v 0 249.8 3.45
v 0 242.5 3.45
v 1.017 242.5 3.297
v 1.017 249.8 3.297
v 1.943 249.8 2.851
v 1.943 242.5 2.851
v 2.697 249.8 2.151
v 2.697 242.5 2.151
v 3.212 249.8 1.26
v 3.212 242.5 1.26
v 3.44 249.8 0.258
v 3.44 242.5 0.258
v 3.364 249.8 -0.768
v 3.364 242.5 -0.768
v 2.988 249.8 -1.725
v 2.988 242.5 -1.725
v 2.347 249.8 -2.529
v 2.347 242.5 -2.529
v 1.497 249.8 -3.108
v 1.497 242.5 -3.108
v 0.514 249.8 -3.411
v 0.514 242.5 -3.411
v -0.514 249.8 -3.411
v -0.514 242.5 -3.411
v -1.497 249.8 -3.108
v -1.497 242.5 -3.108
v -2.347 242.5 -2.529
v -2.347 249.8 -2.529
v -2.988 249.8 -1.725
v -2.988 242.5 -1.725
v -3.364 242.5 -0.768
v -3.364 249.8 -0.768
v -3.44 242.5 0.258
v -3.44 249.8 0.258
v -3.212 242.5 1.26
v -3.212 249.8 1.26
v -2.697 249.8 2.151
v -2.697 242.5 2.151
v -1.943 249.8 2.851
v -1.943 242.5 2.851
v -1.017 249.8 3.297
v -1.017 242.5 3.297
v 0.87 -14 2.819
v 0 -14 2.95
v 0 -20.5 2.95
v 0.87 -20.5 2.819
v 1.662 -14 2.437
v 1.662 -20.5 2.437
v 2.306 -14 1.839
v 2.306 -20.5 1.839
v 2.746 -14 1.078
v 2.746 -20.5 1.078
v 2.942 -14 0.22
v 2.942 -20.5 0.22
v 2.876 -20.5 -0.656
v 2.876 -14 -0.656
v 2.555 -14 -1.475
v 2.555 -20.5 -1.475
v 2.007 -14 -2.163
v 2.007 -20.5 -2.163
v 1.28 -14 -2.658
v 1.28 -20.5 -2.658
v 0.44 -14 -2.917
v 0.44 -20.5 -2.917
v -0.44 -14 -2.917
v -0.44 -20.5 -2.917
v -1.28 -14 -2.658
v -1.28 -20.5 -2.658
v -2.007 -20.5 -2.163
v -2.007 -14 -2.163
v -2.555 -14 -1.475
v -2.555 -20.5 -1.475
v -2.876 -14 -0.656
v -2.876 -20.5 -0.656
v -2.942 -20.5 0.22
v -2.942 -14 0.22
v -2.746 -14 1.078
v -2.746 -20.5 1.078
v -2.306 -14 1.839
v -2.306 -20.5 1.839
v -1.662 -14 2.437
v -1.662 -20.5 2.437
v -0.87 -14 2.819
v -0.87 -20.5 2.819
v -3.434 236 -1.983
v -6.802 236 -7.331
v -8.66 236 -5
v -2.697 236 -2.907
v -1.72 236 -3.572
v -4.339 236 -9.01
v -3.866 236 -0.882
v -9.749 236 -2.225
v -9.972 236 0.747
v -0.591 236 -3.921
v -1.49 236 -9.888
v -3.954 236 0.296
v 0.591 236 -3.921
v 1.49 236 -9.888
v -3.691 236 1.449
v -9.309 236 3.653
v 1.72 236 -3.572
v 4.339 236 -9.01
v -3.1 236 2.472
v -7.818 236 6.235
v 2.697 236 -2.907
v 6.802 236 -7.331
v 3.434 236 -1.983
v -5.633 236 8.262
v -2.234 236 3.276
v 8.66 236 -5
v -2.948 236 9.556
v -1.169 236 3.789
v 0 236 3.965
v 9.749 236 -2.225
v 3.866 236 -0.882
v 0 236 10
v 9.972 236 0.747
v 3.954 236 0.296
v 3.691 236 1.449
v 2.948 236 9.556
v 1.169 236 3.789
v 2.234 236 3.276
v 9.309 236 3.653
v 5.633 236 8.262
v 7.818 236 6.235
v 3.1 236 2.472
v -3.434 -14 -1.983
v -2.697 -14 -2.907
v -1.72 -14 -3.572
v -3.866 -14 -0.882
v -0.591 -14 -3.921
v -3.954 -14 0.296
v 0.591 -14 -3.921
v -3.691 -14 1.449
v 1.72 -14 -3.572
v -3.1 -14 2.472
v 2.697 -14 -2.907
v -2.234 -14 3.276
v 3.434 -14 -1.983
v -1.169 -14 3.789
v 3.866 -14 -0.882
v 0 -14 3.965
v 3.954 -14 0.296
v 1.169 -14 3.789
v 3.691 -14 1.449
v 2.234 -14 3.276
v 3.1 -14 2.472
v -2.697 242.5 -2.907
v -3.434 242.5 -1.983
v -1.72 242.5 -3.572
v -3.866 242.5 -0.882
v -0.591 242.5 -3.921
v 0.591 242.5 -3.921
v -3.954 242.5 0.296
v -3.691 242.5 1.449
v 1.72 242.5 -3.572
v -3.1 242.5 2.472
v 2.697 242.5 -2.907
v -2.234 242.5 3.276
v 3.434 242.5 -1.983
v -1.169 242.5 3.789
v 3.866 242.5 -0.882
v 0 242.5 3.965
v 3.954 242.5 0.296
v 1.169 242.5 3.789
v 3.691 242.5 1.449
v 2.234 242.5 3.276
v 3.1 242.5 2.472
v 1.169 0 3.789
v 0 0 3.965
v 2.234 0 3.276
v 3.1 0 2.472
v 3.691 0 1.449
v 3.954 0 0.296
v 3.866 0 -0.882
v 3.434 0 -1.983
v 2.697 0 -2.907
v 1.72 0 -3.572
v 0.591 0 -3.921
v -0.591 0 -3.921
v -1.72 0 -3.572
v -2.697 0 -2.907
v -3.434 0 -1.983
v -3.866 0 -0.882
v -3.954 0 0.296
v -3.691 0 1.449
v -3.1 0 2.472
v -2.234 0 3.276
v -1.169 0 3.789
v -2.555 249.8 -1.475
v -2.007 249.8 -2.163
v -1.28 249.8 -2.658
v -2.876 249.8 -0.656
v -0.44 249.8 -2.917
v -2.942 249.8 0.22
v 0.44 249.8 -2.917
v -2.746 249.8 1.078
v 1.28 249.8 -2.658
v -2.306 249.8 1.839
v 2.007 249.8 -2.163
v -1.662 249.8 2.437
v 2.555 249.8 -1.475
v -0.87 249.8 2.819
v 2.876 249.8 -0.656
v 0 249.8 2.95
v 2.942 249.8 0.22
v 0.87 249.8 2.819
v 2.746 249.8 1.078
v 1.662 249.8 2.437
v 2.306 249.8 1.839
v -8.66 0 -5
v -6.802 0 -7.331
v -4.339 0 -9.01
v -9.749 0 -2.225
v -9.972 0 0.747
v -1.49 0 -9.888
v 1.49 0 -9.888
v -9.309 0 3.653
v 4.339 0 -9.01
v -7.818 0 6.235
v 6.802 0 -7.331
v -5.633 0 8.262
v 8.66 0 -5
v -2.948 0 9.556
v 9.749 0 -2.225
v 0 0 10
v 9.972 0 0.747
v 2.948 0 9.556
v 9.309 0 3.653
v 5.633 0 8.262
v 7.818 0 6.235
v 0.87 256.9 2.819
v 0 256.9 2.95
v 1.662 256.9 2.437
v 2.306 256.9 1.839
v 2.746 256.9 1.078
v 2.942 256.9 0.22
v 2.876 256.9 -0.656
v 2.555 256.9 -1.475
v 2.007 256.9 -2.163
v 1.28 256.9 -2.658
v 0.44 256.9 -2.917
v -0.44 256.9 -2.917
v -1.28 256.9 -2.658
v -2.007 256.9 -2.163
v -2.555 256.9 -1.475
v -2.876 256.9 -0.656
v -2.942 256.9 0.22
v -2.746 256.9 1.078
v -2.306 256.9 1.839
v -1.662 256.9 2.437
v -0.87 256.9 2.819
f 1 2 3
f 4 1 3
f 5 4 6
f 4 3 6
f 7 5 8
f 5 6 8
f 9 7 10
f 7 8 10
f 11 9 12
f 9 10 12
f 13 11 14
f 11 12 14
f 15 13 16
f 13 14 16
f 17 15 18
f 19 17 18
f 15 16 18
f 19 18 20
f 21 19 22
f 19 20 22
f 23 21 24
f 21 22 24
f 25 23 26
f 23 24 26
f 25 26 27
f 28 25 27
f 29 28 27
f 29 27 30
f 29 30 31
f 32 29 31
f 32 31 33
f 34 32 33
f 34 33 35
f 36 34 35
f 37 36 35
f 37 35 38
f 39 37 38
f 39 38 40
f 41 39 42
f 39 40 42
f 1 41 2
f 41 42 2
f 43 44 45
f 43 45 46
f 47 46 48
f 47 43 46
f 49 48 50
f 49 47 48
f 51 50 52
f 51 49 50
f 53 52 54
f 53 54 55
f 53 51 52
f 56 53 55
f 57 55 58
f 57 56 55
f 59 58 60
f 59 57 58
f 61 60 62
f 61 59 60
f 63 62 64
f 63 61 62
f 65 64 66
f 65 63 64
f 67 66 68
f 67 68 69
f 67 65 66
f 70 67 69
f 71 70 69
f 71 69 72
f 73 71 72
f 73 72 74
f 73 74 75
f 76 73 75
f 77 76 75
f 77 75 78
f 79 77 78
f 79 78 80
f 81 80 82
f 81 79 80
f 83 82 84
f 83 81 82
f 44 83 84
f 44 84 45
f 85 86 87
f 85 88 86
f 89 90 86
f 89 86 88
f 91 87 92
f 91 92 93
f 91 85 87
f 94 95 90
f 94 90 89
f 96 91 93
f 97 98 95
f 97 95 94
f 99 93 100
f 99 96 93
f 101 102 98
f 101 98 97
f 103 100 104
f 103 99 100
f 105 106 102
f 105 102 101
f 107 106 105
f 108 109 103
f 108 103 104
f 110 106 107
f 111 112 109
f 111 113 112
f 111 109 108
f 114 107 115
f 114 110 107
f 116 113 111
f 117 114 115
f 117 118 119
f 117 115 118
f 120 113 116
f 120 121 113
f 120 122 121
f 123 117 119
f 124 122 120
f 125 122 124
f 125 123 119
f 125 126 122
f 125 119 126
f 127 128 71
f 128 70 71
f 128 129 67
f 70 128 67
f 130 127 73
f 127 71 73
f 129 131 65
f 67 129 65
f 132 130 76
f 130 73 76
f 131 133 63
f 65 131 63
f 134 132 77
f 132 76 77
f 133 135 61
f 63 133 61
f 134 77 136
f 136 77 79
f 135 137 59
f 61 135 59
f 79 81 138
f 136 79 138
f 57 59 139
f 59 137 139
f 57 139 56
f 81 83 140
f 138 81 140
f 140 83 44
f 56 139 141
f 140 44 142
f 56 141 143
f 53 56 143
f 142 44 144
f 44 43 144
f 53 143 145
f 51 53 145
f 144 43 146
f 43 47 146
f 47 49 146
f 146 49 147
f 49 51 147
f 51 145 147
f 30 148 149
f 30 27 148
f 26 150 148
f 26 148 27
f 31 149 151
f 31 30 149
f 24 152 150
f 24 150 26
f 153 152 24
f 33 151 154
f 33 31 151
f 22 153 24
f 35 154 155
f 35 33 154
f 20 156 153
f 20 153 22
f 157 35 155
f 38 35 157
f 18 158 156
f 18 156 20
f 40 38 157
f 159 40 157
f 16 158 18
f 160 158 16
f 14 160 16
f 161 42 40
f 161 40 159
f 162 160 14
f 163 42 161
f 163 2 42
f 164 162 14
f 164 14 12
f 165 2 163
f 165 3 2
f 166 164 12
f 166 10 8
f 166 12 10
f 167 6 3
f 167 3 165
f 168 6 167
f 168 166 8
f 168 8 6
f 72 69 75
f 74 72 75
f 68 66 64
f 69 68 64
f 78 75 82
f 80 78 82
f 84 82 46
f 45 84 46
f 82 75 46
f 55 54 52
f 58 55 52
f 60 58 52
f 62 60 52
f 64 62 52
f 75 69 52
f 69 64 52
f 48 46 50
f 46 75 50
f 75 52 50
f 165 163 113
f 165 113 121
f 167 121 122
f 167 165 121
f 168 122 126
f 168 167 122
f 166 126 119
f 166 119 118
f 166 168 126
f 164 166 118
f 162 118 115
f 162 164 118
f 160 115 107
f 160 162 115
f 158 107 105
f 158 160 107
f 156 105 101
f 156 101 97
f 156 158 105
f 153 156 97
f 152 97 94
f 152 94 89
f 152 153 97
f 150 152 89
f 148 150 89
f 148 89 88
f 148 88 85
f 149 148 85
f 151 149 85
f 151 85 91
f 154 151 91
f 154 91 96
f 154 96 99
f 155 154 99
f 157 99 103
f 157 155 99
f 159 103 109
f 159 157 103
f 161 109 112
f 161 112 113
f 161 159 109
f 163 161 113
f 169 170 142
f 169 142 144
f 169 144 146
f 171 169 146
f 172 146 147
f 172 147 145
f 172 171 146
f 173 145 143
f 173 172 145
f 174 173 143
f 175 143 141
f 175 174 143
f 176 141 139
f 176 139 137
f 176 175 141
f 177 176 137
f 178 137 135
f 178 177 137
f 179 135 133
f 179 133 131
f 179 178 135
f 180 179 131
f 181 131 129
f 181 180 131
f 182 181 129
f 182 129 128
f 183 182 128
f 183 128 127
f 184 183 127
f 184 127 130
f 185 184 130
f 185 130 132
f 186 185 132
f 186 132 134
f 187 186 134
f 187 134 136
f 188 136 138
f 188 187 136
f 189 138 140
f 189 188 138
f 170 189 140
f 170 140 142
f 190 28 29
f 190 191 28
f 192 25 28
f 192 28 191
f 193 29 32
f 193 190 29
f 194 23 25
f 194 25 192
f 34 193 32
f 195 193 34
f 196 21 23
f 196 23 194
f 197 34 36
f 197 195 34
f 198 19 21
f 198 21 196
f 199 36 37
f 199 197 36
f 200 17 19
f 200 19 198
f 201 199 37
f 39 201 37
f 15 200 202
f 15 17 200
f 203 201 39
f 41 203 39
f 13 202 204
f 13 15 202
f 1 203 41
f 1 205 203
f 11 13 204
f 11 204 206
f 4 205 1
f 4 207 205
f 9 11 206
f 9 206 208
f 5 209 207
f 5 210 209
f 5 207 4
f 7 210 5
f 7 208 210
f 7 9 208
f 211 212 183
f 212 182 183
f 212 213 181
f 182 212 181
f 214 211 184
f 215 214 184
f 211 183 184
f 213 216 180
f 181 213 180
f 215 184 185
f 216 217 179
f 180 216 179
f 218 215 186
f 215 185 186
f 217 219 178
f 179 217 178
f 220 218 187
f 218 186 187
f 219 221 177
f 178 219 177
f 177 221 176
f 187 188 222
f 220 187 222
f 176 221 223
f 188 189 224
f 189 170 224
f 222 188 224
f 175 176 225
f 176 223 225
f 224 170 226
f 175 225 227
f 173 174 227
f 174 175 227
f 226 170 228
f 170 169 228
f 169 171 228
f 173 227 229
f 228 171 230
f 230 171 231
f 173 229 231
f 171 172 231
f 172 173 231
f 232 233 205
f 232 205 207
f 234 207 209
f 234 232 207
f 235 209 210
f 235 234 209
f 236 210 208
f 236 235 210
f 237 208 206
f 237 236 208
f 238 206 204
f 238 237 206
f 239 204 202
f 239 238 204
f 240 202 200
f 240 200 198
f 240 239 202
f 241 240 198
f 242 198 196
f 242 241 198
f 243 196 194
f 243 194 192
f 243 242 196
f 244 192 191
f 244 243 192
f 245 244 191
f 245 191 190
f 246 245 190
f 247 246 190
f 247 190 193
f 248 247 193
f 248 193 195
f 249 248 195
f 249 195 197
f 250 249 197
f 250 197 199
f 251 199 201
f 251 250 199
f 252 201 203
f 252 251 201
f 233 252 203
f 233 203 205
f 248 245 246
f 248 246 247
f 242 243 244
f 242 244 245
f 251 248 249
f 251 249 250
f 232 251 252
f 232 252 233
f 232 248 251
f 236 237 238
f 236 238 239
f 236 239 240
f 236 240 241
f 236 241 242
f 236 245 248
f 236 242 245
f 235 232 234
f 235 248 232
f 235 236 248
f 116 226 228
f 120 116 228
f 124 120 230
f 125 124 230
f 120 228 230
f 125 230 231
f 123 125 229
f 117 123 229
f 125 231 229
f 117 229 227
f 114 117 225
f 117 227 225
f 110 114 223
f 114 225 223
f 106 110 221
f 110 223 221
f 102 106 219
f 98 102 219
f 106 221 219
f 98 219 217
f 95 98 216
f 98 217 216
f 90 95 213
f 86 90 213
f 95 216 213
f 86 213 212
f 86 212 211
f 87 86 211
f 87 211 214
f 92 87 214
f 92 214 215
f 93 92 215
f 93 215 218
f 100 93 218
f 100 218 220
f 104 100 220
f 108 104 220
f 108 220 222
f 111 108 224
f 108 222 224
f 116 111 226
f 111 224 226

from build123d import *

# Parameters (mm, degrees)
SKETCH1_R            = 10
BOSS_EXTRUDE8_DEPTH  = 236
SKETCH1_9_R          = 3.965
BOSS_EXTRUDE9_DEPTH  = 14
BOSS_EXTRUDE10_START = -14
SKETCH1_10_R         = 2.95
BOSS_EXTRUDE10_DEPTH = 6.5
BOSS_EXTRUDE11_START = 242.5
SKETCH1_11_R         = 3.965
BOSS_EXTRUDE11_DEPTH = 6.5
BOSS_EXTRUDE12_START = 242.5
SKETCH1_12_R         = 3.45
BOSS_EXTRUDE12_DEPTH = 7.3
BOSS_EXTRUDE13_START = 256.9
SKETCH1_13_R         = 2.95
BOSS_EXTRUDE13_DEPTH = 7.1


with BuildPart() as part:
    # Sketch1 → Boss-Extrude8 (new body)
    with BuildSketch(Plane(origin=(0, 0, 0), x_dir=(1, 0, 0), z_dir=(0, 1, 0))):
        with Locations(Location((0, 0, 0), (0, 0, 270))):
            Circle(SKETCH1_R)
    extrude(amount=BOSS_EXTRUDE8_DEPTH)

    # Sketch1<9> → Boss-Extrude9 (add)
    with BuildSketch(Plane(origin=(0, 0, 0), x_dir=(1, 0, 0), z_dir=(0, 1, 0))):
        with Locations(Location((0, 0, 0), (0, 0, 270))):
            Circle(SKETCH1_9_R)
    extrude(amount=-BOSS_EXTRUDE9_DEPTH)

    # Sketch1<10> → Boss-Extrude10 (add)
    with BuildSketch(Plane(origin=(0, 0, 0), x_dir=(1, 0, 0), z_dir=(0, 1, 0)).offset(BOSS_EXTRUDE10_START)):
        with Locations(Location((0, 0, 0), (0, 0, 270))):
            Circle(SKETCH1_10_R)
    extrude(amount=-BOSS_EXTRUDE10_DEPTH)

    # Sketch1<11> → Boss-Extrude11 (add)
    with BuildSketch(Plane(origin=(0, 0, 0), x_dir=(1, 0, 0), z_dir=(0, 1, 0)).offset(BOSS_EXTRUDE11_START)):
        with Locations(Location((0, 0, 0), (0, 0, 270))):
            Circle(SKETCH1_11_R)
    extrude(amount=-BOSS_EXTRUDE11_DEPTH)

    # Sketch1<12> → Boss-Extrude12 (add)
    with BuildSketch(Plane(origin=(0, 0, 0), x_dir=(1, 0, 0), z_dir=(0, 1, 0)).offset(BOSS_EXTRUDE12_START)):
        with Locations(Location((0, 0, 0), (0, 0, 270))):
            Circle(SKETCH1_12_R)
    extrude(amount=BOSS_EXTRUDE12_DEPTH)

    # Sketch1<13> → Boss-Extrude13 (add)
    with BuildSketch(Plane(origin=(0, 0, 0), x_dir=(1, 0, 0), z_dir=(0, 1, 0)).offset(BOSS_EXTRUDE13_START)):
        with Locations(Location((0, 0, 0), (0, 0, 270))):
            Circle(SKETCH1_13_R)
    extrude(amount=-BOSS_EXTRUDE13_DEPTH)


solid = part.part
